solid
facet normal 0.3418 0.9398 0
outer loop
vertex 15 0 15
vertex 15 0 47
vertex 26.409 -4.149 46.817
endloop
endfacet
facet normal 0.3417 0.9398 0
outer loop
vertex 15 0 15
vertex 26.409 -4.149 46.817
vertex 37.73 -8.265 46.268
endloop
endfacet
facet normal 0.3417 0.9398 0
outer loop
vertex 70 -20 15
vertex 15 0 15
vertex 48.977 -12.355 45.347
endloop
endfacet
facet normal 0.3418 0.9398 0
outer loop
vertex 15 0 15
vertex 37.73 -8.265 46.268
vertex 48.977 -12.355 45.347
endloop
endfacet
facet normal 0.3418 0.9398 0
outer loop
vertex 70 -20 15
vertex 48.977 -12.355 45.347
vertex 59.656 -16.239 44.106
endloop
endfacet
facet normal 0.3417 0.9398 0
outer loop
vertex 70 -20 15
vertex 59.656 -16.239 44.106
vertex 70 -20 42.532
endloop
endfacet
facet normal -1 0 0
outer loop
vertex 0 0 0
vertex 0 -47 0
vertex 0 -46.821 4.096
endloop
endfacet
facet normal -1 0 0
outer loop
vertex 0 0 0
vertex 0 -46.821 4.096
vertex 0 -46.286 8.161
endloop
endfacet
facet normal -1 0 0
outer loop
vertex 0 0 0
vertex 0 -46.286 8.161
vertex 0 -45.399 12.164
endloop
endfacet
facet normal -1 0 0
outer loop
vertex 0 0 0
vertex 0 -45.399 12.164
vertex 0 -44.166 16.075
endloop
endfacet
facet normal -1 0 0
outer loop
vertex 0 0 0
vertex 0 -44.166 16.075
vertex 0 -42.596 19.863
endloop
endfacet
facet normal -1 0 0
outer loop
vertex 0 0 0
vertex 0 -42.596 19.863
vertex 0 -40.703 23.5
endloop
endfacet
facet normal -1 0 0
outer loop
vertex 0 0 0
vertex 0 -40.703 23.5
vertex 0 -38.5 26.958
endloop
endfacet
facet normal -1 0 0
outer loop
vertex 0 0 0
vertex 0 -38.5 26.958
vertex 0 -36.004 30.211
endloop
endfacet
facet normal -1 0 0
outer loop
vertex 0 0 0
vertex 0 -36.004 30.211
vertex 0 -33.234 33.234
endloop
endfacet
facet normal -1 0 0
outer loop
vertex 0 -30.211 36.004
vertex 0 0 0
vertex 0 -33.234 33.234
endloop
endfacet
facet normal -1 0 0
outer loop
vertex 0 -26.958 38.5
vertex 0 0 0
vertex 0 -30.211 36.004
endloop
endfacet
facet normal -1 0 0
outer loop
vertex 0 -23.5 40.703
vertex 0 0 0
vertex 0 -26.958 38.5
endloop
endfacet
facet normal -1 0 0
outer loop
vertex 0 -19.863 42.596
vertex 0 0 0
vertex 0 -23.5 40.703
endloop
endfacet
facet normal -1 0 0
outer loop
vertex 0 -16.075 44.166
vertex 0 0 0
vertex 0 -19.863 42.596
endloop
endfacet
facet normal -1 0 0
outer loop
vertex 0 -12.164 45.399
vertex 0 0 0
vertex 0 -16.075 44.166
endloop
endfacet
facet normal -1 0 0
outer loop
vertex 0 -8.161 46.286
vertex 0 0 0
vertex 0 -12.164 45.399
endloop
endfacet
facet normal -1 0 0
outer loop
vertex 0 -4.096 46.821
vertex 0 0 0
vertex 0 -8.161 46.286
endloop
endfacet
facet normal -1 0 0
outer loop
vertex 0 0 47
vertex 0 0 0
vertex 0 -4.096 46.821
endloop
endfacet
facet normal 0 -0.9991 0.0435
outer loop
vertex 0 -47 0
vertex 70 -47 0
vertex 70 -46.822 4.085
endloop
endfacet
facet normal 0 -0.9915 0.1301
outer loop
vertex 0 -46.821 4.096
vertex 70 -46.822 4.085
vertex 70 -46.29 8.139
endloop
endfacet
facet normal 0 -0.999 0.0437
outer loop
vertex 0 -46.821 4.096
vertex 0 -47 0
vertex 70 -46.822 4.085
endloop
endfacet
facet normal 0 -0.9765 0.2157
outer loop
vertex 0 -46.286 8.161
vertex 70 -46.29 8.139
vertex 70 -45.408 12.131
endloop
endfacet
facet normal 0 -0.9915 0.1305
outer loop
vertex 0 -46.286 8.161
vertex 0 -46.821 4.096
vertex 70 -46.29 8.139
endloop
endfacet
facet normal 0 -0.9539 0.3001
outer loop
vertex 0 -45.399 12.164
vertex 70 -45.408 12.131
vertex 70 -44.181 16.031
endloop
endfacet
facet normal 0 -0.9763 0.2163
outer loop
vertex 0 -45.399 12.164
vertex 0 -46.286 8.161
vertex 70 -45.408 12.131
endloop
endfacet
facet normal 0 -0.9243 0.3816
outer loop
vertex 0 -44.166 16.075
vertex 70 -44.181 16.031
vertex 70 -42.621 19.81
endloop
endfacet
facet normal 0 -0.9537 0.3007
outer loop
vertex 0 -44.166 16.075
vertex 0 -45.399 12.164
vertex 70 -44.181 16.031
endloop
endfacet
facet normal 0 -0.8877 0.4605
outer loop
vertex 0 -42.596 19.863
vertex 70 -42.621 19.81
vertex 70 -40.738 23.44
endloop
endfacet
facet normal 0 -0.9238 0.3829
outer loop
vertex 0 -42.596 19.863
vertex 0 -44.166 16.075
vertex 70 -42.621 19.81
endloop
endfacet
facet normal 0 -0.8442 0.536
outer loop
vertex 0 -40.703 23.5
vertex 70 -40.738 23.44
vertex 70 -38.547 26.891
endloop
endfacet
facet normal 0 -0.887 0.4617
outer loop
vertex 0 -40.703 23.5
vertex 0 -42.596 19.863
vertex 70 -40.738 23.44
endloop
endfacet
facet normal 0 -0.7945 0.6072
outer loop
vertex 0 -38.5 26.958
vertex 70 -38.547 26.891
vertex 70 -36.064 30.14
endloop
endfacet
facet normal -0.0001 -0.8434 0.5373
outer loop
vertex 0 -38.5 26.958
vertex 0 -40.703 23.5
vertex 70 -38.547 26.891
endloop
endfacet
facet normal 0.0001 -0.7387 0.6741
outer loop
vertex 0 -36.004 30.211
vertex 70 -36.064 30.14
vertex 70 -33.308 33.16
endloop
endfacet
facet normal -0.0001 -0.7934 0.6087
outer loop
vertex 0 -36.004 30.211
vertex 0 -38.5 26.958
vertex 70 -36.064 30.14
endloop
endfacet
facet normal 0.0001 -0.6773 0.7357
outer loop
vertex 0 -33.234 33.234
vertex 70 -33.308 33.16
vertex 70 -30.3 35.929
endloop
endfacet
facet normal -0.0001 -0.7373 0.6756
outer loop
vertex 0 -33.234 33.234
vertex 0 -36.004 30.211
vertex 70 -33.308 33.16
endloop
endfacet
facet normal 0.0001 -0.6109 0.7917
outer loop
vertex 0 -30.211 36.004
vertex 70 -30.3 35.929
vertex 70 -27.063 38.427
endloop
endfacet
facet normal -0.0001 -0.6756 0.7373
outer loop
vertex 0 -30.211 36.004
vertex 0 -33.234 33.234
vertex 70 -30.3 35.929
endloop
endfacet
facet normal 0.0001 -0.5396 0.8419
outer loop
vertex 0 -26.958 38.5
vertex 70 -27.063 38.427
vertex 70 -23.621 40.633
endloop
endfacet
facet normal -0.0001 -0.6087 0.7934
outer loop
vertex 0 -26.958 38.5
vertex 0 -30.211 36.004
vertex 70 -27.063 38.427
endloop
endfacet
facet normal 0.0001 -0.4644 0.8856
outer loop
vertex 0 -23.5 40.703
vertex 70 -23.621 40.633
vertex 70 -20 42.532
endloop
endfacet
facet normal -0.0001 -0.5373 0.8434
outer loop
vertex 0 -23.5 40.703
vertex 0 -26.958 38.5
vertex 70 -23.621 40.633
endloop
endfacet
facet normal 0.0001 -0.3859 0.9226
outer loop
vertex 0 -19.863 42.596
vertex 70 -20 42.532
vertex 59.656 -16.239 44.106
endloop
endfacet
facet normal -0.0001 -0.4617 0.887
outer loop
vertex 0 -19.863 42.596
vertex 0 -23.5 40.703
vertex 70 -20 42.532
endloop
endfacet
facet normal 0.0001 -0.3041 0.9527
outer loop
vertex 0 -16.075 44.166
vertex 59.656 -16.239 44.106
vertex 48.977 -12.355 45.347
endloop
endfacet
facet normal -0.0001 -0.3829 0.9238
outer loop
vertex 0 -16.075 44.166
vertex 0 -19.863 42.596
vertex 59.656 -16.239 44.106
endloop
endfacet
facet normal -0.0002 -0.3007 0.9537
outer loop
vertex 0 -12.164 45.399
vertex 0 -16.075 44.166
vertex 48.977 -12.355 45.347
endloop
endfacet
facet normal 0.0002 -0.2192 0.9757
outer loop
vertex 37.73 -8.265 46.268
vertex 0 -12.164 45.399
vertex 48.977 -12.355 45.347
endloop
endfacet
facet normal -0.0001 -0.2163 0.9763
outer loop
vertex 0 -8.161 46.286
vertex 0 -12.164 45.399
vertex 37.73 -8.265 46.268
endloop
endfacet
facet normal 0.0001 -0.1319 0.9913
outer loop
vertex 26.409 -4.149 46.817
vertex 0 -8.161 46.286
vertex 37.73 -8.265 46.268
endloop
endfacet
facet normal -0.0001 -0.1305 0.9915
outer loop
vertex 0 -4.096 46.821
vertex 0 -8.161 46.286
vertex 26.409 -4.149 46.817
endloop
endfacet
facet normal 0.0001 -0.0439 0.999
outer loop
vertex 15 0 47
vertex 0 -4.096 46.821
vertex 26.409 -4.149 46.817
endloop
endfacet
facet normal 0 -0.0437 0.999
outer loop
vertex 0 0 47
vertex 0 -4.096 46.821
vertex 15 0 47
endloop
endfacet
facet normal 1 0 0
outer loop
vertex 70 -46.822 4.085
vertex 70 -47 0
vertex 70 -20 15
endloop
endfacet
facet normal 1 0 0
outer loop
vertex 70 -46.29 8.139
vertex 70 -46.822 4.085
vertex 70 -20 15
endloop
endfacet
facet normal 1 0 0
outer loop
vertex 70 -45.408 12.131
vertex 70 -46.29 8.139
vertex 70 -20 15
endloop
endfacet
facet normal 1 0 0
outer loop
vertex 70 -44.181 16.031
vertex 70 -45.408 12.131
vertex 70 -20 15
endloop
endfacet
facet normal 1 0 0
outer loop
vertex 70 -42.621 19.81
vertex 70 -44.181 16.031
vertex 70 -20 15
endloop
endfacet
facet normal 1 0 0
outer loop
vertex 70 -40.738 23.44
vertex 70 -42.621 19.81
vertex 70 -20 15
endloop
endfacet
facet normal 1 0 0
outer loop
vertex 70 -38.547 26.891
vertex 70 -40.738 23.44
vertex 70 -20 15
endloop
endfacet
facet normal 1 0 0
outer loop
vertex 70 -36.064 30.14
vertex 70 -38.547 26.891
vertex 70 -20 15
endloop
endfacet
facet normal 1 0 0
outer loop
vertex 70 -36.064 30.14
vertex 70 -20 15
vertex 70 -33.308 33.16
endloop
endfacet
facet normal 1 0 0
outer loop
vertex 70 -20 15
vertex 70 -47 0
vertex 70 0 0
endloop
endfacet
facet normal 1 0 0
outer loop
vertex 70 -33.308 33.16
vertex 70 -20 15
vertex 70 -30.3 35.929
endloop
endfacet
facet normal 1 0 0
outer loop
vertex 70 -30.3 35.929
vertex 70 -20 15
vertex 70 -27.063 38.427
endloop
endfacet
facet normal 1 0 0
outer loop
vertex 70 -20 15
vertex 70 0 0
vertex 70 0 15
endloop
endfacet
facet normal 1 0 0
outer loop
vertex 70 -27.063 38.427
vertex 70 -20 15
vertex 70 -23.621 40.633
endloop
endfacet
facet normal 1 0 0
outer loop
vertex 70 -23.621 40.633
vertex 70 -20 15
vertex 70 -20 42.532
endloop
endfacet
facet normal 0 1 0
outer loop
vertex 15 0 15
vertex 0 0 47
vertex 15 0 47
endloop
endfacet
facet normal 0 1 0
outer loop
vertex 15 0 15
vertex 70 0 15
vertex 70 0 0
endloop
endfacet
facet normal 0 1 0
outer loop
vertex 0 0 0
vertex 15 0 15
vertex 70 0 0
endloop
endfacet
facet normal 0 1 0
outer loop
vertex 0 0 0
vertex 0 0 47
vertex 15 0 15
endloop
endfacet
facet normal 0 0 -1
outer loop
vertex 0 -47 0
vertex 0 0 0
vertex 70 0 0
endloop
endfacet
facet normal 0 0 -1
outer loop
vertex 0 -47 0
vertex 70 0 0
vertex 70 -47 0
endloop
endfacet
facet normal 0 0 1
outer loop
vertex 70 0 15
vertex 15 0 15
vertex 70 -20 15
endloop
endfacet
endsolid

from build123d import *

# Parameters (mm, degrees)
BOSS_EXTRUDE1_DEPTH = 70
CUT_EXTRUDE2_DEPTH  = 32


with BuildPart() as part:
    # Sketch1 → Boss-Extrude1 (new body)
    with BuildSketch(Plane(origin=(0, 0, 0), x_dir=(0, 0, -1), z_dir=(1, 0, 0))):
        with BuildLine():
            Line((-47, 0), (0, 0))
            Line((0, 0), (0, -47))
            ThreePointArc((0, -47), (-33.234018716, -33.234018716), (-47, 0))
        make_face()
    extrude(amount=BOSS_EXTRUDE1_DEPTH)

    # Sketch3 → Cut-Extrude2 (cut)
    with BuildSketch(Plane(origin=(0, 0, 47), x_dir=(-1, 0, 0), z_dir=(0, 0, -1))):
        Polygon((-15, 0), (-70, -20), (-70, 0), align=None)
    extrude(amount=CUT_EXTRUDE2_DEPTH, mode=Mode.SUBTRACT)


solid = part.part
